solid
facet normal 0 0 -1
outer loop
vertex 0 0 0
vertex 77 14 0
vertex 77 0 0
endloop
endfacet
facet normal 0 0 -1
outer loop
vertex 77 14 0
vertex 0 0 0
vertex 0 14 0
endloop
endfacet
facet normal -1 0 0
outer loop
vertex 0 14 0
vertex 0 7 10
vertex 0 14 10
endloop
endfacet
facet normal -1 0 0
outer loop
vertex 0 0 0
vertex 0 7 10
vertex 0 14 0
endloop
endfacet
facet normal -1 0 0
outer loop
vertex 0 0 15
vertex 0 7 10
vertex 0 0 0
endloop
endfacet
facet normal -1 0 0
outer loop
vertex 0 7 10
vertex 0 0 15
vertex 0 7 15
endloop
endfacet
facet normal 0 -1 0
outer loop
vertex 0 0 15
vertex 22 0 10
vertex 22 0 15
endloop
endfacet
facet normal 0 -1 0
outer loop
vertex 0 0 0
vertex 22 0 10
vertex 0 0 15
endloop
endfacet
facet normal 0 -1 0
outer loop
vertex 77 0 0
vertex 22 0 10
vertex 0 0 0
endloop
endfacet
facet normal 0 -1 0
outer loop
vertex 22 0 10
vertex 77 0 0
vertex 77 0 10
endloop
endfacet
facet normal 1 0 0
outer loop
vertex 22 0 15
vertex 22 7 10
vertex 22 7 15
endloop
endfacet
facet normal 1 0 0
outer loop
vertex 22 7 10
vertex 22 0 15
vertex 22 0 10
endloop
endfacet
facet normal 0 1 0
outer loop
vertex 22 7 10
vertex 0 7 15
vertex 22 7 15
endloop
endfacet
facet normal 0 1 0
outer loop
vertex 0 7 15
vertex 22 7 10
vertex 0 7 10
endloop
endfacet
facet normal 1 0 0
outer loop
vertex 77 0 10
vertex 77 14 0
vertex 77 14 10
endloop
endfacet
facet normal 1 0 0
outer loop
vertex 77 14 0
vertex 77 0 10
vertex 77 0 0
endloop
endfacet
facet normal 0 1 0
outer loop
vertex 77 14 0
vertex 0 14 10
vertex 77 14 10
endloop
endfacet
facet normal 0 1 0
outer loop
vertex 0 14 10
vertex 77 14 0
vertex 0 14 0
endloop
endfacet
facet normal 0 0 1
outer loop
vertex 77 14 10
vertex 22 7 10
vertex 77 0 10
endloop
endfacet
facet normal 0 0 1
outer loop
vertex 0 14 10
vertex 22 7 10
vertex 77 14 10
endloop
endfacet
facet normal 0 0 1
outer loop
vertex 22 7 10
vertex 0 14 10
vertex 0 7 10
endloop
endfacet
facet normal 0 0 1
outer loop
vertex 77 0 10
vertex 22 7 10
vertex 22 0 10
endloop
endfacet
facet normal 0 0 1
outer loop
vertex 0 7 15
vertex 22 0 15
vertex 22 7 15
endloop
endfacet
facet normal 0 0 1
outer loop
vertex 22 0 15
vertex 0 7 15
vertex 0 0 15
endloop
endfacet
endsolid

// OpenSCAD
translate([5.5, 3.5, 2.5]) color([0.5200631817170318, 0.5692567569896342, 0.8758772851227178]) cube([11, 7, 5], center=true);
translate([16.5, 3.5, 2.5]) color([0.2296552367022351, 0.7763426439418957, 0.8846860519705121]) cube([11, 7, 5], center=true);
translate([27.5, 3.5, 2.5]) color([0.6274277551427163, 0.5024128608294012, 0.5237115354844265]) cube([11, 7, 5], center=true);
translate([38.5, 3.5, 2.5]) color([0.5071067236759631, 0.9454855480301745, 0.14569042195357562]) cube([11, 7, 5], center=true);
translate([49.5, 3.5, 2.5]) color([0.8918421087116969, 0.42205651792049836, 0.08403205823715598]) cube([11, 7, 5], center=true);
translate([60.5, 3.5, 2.5]) color([0.1047646210762947, 0.06292282863863541, 0.4151614515022839]) cube([11, 7, 5], center=true);
translate([71.5, 3.5, 2.5]) color([0.15615697007089357, 0.9545538427732947, 0.7913428503775491]) cube([11, 7, 5], center=true);
translate([5.5, 10.5, 2.5]) color([0.43108631436838285, 0.41701950900356644, 0.4966247746294912]) cube([11, 7, 5], center=true);
translate([16.5, 10.5, 2.5]) color([0.86405767472269, 0.32449912818180593, 0.25258592574699623]) cube([11, 7, 5], center=true);
translate([27.5, 10.5, 2.5]) color([0.35250302456564797, 0.12137799977699892, 0.691775150815975]) cube([11, 7, 5], center=true);
translate([38.5, 10.5, 2.5]) color([0.34544510653523897, 0.17790766067776254, 0.830270051764872]) cube([11, 7, 5], center=true);
translate([49.5, 10.5, 2.5]) color([0.23049353673314077, 0.3658024748453319, 0.5965890354919068]) cube([11, 7, 5], center=true);
translate([60.5, 10.5, 2.5]) color([0.14329113966210216, 0.003232100641658797, 0.6590184917581017]) cube([11, 7, 5], center=true);
translate([71.5, 10.5, 2.5]) color([0.7321014772226084, 0.9009039411186286, 0.7479768172441763]) cube([11, 7, 5], center=true);
translate([5.5, 3.5, 7.5]) color([0.29326295382626455, 0.6894664766240866, 0.932788033819558]) cube([11, 7, 5], center=true);
translate([16.5, 3.5, 7.5]) color([0.23286310478430694, 0.14188743522012004, 0.4540480681686925]) cube([11, 7, 5], center=true);
translate([27.5, 3.5, 7.5]) color([0.4766939084563374, 0.7074804824528956, 0.2582188407343454]) cube([11, 7, 5], center=true);
translate([38.5, 3.5, 7.5]) color([0.027936242271358158, 0.20812012525081536, 0.33501316214628807]) cube([11, 7, 5], center=true);
translate([49.5, 3.5, 7.5]) color([0.9609071038114427, 0.29634664160852753, 0.8784103092413238]) cube([11, 7, 5], center=true);
translate([60.5, 3.5, 7.5]) color([0.5532045188241876, 0.32698413866792275, 0.5930193960141523]) cube([11, 7, 5], center=true);
translate([71.5, 3.5, 7.5]) color([0.08080901281968078, 0.5332278801564081, 0.30776249733867533]) cube([11, 7, 5], center=true);
translate([5.5, 10.5, 7.5]) color([0.3765889324074634, 0.14692685712634312, 0.1252359956830017]) cube([11, 7, 5], center=true);
translate([16.5, 10.5, 7.5]) color([0.2228174233130471, 0.5083324480268261, 0.23665719296677712]) cube([11, 7, 5], center=true);
translate([27.5, 10.5, 7.5]) color([0.18394442119493715, 0.3724619255943996, 0.6631955135334705]) cube([11, 7, 5], center=true);
translate([38.5, 10.5, 7.5]) color([0.8609746033864751, 0.6012082175951422, 0.3938011681878649]) cube([11, 7, 5], center=true);
translate([49.5, 10.5, 7.5]) color([0.7021695231885549, 0.13202027544551864, 0.29938666187805807]) cube([11, 7, 5], center=true);
translate([60.5, 10.5, 7.5]) color([0.4167493264442593, 0.9263964007964989, 0.5910765187605377]) cube([11, 7, 5], center=true);
translate([71.5, 10.5, 7.5]) color([0.2980281087530109, 0.35456411603507165, 0.24805850121983253]) cube([11, 7, 5], center=true);
translate([5.5, 3.5, 12.5]) color([0.6327789974902275, 0.6370445113549524, 0.5292072971005523]) cube([11, 7, 5], center=true);
translate([16.5, 3.5, 12.5]) color([0.376431751315491, 0.008427608141492793, 0.9619565585865117]) cube([11, 7, 5], center=true);
